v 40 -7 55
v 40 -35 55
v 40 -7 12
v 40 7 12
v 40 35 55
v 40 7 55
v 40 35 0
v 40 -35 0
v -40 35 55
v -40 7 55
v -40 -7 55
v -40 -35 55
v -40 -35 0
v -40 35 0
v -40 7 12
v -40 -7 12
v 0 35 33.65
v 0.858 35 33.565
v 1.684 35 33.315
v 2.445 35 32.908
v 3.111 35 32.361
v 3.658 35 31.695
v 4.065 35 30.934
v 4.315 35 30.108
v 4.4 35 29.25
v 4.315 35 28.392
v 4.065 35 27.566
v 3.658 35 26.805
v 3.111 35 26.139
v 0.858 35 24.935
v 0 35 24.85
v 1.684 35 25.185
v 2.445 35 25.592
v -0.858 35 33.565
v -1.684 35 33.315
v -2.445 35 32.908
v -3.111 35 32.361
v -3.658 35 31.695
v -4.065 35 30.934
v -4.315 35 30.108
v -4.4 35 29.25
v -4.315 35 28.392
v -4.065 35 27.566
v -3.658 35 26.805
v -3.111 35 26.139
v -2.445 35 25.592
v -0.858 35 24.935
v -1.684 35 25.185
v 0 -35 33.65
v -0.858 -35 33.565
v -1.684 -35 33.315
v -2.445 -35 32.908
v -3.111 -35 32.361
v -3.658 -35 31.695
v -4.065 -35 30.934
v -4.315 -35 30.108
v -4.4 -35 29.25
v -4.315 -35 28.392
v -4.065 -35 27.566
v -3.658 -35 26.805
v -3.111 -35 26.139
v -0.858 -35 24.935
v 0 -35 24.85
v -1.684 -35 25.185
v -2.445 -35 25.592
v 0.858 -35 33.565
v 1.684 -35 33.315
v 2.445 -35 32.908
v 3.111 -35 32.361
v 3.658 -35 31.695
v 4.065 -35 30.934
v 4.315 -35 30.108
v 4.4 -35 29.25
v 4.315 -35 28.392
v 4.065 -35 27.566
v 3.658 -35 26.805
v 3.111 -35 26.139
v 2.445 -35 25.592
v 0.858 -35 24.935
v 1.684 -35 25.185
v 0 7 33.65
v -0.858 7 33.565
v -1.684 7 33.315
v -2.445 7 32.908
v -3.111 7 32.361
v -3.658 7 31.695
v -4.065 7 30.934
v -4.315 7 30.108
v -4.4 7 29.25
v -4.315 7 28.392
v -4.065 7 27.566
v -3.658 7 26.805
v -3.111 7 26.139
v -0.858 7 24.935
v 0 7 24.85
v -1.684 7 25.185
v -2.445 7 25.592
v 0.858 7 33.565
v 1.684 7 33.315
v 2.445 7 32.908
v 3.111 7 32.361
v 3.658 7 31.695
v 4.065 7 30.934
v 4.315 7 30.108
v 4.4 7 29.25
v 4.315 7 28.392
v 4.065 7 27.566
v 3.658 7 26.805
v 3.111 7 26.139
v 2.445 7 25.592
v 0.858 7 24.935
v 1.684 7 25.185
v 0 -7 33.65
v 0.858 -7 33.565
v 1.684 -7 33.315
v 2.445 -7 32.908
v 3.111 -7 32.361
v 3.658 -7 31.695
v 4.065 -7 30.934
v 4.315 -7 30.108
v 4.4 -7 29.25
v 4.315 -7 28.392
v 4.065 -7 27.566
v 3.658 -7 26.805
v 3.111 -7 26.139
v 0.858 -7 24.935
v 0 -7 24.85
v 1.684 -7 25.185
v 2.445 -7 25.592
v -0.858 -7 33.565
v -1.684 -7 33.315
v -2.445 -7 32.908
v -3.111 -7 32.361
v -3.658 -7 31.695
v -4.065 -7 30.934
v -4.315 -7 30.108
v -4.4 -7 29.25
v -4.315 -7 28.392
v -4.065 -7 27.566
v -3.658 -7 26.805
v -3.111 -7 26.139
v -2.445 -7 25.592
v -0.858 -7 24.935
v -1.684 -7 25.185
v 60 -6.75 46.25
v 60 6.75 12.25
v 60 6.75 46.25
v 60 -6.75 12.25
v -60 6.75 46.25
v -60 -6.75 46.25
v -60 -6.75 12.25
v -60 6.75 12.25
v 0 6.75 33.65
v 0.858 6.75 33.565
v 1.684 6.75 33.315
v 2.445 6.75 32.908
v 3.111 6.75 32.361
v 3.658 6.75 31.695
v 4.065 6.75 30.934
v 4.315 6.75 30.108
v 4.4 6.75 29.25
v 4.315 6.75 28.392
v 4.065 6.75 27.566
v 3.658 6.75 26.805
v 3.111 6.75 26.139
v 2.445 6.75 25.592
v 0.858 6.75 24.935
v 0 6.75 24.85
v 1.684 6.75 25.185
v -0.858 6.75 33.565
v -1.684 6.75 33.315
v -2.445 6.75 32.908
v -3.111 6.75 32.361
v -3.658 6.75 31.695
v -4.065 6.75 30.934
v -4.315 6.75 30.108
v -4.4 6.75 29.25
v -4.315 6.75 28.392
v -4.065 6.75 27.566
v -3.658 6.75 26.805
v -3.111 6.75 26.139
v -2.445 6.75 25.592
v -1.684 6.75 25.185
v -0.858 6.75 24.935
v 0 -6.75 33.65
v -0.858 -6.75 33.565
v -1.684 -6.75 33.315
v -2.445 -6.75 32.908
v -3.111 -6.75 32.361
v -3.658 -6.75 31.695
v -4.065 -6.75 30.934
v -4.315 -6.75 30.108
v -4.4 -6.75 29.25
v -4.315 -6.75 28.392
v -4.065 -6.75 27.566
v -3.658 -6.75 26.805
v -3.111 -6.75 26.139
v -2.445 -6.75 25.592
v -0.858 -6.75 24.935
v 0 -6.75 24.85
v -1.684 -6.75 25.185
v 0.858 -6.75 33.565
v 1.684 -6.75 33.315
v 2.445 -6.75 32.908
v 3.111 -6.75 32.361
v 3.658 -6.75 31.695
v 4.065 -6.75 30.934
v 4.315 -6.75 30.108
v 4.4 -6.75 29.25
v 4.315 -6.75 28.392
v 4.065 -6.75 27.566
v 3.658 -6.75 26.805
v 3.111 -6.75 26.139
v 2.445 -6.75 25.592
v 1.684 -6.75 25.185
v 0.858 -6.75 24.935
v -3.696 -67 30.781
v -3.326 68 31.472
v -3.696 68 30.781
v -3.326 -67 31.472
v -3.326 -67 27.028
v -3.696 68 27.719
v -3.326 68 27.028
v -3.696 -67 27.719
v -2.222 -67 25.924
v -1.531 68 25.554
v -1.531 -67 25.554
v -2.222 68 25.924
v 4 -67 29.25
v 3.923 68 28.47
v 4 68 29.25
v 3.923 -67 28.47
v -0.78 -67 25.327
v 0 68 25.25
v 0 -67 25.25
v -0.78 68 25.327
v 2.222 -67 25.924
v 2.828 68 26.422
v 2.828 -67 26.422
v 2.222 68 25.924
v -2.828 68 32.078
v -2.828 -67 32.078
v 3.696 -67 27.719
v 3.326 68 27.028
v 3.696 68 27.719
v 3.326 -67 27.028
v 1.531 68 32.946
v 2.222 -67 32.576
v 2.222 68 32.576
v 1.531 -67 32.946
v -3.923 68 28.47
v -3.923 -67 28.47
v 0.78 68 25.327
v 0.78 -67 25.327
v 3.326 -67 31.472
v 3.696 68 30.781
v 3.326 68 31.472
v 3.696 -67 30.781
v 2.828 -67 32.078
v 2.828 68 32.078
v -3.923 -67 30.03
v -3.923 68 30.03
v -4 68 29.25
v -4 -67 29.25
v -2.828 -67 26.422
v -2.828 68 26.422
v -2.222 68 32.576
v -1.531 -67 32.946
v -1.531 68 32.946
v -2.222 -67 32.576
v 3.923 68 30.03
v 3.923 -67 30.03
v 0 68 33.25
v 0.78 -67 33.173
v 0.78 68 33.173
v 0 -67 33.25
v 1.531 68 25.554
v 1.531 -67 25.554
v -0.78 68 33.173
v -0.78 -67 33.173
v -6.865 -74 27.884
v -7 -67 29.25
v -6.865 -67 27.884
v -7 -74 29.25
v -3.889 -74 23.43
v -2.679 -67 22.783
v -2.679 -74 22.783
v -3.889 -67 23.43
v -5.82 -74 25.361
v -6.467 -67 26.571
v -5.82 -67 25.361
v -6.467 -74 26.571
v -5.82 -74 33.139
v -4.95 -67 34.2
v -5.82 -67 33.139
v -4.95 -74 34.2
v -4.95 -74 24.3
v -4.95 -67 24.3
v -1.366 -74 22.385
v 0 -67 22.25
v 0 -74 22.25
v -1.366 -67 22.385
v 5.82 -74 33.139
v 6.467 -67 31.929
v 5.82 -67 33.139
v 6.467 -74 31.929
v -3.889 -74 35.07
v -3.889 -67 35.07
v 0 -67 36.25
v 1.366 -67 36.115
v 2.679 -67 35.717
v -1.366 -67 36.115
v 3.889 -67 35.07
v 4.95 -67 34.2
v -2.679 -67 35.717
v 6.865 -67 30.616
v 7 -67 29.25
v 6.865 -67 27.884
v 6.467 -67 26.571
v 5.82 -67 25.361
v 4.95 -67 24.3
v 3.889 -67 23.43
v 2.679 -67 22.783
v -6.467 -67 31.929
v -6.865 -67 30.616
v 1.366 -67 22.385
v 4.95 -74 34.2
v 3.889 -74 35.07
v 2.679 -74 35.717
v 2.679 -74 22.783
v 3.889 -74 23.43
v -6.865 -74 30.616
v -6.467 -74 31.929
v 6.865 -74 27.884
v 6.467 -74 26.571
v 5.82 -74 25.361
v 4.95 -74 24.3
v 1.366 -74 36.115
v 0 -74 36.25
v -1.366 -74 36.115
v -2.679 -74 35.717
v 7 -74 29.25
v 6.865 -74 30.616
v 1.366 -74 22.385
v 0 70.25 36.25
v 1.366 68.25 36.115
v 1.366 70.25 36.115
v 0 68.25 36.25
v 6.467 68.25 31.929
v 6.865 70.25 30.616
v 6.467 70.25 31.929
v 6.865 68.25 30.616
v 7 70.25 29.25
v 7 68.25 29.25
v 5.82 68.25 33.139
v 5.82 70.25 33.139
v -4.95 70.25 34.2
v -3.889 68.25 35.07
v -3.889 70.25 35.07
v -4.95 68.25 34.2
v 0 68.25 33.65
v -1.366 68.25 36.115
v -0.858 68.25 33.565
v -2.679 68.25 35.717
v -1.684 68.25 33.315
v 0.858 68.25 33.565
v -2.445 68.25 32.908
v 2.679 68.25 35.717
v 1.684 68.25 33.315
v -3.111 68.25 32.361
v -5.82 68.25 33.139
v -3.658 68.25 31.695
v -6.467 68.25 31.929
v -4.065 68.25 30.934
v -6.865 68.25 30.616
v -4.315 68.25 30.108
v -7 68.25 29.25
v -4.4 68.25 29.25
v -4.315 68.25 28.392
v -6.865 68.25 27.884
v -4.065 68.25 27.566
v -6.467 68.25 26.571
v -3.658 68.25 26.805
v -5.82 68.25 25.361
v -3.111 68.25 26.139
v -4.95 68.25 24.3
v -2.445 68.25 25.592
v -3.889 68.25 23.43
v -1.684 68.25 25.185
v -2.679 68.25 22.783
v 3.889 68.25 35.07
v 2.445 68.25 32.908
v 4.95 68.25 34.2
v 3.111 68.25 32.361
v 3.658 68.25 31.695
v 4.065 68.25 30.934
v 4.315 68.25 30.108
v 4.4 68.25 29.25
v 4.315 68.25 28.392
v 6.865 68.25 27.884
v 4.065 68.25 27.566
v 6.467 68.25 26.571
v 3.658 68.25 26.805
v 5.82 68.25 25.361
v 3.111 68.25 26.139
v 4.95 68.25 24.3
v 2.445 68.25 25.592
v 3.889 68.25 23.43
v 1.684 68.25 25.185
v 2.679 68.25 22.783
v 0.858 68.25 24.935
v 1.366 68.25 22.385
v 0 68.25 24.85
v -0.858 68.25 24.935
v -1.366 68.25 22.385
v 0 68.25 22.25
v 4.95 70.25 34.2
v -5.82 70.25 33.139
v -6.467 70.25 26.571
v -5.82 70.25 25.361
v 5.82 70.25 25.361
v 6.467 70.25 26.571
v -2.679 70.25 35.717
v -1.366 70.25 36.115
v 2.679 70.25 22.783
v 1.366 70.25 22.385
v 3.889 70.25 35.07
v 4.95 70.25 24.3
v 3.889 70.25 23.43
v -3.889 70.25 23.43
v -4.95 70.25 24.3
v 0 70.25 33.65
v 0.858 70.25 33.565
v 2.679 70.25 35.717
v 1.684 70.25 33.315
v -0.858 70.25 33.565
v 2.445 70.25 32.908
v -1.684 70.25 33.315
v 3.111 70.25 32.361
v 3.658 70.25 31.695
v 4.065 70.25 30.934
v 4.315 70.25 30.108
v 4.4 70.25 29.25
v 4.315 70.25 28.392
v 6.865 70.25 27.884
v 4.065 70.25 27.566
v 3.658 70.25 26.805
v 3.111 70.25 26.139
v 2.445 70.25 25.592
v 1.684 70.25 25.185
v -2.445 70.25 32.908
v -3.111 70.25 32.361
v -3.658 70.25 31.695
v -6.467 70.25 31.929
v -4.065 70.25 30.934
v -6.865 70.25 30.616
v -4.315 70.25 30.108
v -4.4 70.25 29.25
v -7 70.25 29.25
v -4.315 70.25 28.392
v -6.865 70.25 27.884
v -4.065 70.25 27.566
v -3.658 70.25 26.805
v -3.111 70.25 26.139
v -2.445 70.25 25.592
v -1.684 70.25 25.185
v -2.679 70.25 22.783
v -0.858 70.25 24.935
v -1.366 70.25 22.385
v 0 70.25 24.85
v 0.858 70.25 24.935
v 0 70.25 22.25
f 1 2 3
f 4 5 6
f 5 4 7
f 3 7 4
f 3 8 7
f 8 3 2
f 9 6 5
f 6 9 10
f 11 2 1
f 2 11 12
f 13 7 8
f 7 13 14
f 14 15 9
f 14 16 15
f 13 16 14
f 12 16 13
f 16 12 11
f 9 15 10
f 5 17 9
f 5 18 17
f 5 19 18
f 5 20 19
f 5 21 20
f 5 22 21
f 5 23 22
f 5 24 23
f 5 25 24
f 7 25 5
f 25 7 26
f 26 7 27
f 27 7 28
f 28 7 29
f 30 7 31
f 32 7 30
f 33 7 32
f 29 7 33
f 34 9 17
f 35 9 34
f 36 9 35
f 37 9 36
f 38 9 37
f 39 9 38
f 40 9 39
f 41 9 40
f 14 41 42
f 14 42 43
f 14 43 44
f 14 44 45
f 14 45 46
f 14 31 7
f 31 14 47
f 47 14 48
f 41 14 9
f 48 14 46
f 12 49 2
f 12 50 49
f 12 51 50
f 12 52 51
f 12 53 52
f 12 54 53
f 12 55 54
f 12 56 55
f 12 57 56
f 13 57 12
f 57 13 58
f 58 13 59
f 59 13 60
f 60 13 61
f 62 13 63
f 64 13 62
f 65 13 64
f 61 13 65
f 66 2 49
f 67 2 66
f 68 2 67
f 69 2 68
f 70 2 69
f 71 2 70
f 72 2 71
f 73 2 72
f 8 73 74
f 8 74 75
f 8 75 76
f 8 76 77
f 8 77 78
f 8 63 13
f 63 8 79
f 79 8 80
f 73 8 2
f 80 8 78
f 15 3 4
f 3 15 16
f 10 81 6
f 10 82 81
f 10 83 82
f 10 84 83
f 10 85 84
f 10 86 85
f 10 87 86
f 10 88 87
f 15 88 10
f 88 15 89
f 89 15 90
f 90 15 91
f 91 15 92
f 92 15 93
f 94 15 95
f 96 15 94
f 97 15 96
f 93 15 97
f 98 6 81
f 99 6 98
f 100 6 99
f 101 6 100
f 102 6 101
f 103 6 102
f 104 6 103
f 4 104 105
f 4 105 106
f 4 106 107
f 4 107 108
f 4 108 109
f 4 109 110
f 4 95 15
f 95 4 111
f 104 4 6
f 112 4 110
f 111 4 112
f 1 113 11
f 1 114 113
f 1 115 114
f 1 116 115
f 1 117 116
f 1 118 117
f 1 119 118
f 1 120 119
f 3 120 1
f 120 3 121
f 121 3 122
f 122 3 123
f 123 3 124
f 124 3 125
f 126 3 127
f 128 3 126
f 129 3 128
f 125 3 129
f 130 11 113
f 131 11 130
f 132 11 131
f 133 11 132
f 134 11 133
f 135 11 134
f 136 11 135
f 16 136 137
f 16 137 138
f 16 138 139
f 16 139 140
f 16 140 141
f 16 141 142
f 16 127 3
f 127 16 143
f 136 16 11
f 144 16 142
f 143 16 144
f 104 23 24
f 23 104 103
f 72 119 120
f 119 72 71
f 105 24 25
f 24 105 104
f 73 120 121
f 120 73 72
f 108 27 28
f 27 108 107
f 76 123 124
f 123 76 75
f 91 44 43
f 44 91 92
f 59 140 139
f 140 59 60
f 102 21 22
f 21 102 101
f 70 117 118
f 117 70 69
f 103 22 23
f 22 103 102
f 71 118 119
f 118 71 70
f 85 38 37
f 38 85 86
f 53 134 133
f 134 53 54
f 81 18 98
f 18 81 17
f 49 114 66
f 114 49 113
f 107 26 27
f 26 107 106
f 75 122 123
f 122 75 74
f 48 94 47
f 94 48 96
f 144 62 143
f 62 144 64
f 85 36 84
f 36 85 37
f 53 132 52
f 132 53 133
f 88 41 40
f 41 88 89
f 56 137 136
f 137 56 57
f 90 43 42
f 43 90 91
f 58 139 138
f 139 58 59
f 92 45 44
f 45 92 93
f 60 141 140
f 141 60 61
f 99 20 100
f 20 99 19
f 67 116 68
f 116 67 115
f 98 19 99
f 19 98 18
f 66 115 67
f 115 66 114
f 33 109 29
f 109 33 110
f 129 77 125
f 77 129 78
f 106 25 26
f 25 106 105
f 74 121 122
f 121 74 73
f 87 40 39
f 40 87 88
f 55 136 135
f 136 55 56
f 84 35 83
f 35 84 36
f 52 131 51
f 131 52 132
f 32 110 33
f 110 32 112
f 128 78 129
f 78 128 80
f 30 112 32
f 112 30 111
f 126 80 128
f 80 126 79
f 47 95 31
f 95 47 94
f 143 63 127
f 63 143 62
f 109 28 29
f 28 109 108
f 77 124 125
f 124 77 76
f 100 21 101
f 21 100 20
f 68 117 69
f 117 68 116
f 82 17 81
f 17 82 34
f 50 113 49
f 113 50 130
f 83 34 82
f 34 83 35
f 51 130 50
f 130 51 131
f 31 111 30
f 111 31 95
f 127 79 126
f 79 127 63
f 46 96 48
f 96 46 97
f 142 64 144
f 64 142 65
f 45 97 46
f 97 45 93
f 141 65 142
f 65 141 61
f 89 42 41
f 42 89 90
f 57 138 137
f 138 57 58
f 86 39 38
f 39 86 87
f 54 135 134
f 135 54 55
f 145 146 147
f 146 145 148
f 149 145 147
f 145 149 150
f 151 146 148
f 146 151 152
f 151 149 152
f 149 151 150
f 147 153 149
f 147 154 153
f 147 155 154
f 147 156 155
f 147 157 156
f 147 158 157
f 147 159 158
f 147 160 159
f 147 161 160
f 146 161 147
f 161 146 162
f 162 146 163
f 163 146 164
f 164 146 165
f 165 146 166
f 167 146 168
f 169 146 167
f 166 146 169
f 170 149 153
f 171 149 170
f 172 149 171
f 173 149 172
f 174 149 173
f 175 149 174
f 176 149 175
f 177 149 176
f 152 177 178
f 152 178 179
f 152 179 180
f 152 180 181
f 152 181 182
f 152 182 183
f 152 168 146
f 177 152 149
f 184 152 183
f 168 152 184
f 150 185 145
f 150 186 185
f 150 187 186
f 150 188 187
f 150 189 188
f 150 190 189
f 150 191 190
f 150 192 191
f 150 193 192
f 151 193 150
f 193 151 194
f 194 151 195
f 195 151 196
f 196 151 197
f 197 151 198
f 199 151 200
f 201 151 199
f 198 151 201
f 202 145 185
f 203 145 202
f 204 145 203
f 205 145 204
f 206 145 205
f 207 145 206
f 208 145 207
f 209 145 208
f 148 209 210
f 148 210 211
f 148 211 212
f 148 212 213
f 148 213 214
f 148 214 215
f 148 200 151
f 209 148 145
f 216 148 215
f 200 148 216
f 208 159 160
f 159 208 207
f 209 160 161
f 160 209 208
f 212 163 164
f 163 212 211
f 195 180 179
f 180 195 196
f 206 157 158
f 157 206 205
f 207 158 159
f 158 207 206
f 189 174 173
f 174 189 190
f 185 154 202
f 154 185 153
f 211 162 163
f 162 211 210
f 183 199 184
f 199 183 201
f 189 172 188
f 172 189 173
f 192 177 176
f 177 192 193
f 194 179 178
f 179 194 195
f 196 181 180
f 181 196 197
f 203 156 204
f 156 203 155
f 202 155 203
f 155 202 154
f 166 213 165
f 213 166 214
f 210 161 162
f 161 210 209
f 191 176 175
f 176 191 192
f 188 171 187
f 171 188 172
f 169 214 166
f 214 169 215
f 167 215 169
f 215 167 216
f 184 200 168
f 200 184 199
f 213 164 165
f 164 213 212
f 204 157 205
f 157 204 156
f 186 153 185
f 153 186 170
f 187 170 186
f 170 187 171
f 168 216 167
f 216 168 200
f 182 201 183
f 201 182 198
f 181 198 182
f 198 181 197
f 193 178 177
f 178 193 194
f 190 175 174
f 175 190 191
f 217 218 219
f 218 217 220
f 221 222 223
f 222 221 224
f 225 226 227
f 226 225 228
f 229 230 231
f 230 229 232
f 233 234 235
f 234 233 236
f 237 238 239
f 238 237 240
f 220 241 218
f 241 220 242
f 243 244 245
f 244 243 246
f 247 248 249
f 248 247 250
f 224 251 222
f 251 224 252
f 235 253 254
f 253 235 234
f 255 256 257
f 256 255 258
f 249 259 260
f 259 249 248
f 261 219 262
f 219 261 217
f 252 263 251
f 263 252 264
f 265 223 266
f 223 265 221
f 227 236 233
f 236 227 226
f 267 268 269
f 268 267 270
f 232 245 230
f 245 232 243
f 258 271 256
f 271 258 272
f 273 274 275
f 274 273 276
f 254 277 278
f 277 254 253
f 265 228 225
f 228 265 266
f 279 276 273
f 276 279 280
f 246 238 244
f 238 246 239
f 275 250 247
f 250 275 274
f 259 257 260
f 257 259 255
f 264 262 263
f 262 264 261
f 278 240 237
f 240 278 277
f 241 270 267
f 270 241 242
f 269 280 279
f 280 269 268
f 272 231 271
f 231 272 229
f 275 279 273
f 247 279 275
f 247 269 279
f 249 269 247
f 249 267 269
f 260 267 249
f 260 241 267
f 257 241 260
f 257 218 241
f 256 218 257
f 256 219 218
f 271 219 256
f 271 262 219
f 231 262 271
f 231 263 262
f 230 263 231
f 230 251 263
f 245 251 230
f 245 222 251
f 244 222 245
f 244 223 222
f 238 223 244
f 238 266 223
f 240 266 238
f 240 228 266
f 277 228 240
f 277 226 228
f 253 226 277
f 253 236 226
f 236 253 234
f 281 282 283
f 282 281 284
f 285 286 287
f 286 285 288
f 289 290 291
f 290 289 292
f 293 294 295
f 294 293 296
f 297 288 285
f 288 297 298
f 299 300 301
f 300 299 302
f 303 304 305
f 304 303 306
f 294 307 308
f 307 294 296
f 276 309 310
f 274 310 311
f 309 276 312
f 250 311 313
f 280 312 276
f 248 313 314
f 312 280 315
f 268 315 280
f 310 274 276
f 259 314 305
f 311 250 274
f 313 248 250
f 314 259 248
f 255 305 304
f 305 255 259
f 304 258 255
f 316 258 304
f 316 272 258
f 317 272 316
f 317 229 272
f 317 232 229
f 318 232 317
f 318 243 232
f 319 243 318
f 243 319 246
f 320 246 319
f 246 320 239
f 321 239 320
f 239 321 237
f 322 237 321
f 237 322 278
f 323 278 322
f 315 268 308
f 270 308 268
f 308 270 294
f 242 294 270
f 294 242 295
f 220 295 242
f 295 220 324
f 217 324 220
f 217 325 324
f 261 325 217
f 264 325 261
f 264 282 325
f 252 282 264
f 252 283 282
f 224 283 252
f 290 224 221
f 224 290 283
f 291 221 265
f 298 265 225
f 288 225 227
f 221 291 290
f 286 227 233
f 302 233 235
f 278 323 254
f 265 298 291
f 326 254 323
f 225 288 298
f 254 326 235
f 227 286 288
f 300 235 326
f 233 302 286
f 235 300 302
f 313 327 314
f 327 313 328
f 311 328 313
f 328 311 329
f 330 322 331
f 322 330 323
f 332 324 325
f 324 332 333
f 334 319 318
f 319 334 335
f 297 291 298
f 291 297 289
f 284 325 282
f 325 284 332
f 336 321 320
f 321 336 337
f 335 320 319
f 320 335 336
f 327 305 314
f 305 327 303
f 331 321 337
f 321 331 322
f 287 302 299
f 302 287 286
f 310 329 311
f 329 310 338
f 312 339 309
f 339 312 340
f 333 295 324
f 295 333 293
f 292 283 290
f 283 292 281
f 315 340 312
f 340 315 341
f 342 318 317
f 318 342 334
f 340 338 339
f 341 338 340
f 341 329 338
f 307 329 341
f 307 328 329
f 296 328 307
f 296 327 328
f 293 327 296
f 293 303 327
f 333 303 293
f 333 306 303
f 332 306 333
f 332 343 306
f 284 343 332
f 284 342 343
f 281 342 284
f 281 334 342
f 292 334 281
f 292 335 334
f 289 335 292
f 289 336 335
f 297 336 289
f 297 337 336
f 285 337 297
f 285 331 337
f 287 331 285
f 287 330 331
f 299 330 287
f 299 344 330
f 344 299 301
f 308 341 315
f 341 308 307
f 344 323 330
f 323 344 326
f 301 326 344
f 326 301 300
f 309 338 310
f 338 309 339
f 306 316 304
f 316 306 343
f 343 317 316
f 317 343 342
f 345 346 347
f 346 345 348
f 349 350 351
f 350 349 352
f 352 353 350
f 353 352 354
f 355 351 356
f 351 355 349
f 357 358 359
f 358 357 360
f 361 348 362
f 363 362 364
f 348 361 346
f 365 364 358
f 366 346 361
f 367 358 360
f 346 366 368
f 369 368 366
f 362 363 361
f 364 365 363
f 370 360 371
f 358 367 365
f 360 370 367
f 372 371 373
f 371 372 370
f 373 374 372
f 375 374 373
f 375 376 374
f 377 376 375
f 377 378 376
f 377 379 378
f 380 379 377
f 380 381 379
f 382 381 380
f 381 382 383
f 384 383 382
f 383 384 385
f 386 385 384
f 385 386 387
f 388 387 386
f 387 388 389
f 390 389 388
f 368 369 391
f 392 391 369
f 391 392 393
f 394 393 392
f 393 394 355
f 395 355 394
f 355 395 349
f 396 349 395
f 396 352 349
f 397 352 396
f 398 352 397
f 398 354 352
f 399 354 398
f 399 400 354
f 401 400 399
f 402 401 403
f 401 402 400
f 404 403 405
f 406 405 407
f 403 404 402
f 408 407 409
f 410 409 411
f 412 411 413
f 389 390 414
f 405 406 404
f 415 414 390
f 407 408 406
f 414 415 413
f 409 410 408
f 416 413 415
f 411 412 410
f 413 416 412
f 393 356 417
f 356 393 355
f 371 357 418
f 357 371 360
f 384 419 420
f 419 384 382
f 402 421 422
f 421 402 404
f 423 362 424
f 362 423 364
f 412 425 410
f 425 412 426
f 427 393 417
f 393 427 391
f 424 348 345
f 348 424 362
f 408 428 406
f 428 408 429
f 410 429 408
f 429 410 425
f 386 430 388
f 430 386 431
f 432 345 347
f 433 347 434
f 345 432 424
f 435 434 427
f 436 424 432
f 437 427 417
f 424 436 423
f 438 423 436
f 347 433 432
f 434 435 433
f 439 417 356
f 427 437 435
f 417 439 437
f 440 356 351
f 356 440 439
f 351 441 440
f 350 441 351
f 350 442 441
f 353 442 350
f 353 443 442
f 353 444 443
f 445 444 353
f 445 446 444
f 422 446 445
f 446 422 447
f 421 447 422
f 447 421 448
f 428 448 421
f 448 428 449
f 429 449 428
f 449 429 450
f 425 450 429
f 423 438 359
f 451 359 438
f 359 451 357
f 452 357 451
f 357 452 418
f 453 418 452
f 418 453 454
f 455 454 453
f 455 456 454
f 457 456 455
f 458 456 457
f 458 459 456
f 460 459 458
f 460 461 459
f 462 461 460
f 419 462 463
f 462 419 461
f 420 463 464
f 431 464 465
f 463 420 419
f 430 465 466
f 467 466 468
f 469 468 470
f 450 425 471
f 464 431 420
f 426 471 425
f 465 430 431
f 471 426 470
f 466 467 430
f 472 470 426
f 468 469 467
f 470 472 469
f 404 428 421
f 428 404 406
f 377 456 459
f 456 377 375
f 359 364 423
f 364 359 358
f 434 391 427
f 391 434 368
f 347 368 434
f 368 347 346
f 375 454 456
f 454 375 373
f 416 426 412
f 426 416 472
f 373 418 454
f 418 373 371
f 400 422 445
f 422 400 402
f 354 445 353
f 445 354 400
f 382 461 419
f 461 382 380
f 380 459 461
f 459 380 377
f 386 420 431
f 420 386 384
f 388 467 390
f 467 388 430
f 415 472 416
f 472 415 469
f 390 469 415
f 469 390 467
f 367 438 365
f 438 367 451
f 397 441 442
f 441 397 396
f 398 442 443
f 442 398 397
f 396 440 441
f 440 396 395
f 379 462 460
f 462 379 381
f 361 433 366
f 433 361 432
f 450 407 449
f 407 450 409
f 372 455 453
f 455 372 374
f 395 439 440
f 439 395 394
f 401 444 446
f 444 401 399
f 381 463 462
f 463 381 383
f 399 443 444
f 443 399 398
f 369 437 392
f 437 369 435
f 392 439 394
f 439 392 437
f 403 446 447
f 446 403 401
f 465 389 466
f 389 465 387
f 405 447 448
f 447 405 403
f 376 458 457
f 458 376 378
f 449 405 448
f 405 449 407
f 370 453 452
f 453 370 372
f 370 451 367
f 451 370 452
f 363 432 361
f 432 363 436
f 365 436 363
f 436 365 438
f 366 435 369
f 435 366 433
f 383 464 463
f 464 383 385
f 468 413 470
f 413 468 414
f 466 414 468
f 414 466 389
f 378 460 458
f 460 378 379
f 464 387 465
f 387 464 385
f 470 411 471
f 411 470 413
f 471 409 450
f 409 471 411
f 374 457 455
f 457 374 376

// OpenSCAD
$fn = 32;

// ------------------------------------------------------------------------
// Clevis joint: 80 mm clevis, pin d8
// Every part is its own module, assembly() places them once.
// ------------------------------------------------------------------------

// --- part 1 ---
module clevis() {
  difference() {
    translate([-40, -35, 0]) cube([80, 70, 55]);
    translate([-41, -7, 12]) cube([82, 14, 44]);
    translate([0, 0, 29.25]) rotate([90, 0, 0]) cylinder(h = 72, d = 8.8, center = true);
  }
}

// --- part 2 ---
module eye() {
  difference() {
    translate([-60, -6.75, 0]) cube([120, 13.5, 34]);
    translate([0, 0, 17]) rotate([90, 0, 0]) cylinder(h = 15.5, d = 8.8, center = true);
  }
}

// --- part 3 ---
module pin() {
  rotate([0, 90, 0]) cylinder(h = 136, d = 8, center = true);
  translate([-74, 0, 0]) rotate([0, 90, 0]) cylinder(h = 7, d = 14);
}

// --- part 4 ---
module retainer() {
  difference() {
      translate([0, 0, 0]) cylinder(h = 2, d = 14);
      translate([0, 0, -1]) cylinder(h = 4, d = 8.8);
    }
}

// --- assembly ---
module assembly() {
  translate([0, 0, 0]) rotate([0, 0, 0]) clevis();
  translate([0, 0, 12.25]) rotate([0, 0, 0]) eye();
  translate([0, 0, 29.25]) rotate([0, 0, 90]) pin();
  translate([0, 70.25, 29.25]) rotate([90, 0, 0]) retainer();
}

assembly();
